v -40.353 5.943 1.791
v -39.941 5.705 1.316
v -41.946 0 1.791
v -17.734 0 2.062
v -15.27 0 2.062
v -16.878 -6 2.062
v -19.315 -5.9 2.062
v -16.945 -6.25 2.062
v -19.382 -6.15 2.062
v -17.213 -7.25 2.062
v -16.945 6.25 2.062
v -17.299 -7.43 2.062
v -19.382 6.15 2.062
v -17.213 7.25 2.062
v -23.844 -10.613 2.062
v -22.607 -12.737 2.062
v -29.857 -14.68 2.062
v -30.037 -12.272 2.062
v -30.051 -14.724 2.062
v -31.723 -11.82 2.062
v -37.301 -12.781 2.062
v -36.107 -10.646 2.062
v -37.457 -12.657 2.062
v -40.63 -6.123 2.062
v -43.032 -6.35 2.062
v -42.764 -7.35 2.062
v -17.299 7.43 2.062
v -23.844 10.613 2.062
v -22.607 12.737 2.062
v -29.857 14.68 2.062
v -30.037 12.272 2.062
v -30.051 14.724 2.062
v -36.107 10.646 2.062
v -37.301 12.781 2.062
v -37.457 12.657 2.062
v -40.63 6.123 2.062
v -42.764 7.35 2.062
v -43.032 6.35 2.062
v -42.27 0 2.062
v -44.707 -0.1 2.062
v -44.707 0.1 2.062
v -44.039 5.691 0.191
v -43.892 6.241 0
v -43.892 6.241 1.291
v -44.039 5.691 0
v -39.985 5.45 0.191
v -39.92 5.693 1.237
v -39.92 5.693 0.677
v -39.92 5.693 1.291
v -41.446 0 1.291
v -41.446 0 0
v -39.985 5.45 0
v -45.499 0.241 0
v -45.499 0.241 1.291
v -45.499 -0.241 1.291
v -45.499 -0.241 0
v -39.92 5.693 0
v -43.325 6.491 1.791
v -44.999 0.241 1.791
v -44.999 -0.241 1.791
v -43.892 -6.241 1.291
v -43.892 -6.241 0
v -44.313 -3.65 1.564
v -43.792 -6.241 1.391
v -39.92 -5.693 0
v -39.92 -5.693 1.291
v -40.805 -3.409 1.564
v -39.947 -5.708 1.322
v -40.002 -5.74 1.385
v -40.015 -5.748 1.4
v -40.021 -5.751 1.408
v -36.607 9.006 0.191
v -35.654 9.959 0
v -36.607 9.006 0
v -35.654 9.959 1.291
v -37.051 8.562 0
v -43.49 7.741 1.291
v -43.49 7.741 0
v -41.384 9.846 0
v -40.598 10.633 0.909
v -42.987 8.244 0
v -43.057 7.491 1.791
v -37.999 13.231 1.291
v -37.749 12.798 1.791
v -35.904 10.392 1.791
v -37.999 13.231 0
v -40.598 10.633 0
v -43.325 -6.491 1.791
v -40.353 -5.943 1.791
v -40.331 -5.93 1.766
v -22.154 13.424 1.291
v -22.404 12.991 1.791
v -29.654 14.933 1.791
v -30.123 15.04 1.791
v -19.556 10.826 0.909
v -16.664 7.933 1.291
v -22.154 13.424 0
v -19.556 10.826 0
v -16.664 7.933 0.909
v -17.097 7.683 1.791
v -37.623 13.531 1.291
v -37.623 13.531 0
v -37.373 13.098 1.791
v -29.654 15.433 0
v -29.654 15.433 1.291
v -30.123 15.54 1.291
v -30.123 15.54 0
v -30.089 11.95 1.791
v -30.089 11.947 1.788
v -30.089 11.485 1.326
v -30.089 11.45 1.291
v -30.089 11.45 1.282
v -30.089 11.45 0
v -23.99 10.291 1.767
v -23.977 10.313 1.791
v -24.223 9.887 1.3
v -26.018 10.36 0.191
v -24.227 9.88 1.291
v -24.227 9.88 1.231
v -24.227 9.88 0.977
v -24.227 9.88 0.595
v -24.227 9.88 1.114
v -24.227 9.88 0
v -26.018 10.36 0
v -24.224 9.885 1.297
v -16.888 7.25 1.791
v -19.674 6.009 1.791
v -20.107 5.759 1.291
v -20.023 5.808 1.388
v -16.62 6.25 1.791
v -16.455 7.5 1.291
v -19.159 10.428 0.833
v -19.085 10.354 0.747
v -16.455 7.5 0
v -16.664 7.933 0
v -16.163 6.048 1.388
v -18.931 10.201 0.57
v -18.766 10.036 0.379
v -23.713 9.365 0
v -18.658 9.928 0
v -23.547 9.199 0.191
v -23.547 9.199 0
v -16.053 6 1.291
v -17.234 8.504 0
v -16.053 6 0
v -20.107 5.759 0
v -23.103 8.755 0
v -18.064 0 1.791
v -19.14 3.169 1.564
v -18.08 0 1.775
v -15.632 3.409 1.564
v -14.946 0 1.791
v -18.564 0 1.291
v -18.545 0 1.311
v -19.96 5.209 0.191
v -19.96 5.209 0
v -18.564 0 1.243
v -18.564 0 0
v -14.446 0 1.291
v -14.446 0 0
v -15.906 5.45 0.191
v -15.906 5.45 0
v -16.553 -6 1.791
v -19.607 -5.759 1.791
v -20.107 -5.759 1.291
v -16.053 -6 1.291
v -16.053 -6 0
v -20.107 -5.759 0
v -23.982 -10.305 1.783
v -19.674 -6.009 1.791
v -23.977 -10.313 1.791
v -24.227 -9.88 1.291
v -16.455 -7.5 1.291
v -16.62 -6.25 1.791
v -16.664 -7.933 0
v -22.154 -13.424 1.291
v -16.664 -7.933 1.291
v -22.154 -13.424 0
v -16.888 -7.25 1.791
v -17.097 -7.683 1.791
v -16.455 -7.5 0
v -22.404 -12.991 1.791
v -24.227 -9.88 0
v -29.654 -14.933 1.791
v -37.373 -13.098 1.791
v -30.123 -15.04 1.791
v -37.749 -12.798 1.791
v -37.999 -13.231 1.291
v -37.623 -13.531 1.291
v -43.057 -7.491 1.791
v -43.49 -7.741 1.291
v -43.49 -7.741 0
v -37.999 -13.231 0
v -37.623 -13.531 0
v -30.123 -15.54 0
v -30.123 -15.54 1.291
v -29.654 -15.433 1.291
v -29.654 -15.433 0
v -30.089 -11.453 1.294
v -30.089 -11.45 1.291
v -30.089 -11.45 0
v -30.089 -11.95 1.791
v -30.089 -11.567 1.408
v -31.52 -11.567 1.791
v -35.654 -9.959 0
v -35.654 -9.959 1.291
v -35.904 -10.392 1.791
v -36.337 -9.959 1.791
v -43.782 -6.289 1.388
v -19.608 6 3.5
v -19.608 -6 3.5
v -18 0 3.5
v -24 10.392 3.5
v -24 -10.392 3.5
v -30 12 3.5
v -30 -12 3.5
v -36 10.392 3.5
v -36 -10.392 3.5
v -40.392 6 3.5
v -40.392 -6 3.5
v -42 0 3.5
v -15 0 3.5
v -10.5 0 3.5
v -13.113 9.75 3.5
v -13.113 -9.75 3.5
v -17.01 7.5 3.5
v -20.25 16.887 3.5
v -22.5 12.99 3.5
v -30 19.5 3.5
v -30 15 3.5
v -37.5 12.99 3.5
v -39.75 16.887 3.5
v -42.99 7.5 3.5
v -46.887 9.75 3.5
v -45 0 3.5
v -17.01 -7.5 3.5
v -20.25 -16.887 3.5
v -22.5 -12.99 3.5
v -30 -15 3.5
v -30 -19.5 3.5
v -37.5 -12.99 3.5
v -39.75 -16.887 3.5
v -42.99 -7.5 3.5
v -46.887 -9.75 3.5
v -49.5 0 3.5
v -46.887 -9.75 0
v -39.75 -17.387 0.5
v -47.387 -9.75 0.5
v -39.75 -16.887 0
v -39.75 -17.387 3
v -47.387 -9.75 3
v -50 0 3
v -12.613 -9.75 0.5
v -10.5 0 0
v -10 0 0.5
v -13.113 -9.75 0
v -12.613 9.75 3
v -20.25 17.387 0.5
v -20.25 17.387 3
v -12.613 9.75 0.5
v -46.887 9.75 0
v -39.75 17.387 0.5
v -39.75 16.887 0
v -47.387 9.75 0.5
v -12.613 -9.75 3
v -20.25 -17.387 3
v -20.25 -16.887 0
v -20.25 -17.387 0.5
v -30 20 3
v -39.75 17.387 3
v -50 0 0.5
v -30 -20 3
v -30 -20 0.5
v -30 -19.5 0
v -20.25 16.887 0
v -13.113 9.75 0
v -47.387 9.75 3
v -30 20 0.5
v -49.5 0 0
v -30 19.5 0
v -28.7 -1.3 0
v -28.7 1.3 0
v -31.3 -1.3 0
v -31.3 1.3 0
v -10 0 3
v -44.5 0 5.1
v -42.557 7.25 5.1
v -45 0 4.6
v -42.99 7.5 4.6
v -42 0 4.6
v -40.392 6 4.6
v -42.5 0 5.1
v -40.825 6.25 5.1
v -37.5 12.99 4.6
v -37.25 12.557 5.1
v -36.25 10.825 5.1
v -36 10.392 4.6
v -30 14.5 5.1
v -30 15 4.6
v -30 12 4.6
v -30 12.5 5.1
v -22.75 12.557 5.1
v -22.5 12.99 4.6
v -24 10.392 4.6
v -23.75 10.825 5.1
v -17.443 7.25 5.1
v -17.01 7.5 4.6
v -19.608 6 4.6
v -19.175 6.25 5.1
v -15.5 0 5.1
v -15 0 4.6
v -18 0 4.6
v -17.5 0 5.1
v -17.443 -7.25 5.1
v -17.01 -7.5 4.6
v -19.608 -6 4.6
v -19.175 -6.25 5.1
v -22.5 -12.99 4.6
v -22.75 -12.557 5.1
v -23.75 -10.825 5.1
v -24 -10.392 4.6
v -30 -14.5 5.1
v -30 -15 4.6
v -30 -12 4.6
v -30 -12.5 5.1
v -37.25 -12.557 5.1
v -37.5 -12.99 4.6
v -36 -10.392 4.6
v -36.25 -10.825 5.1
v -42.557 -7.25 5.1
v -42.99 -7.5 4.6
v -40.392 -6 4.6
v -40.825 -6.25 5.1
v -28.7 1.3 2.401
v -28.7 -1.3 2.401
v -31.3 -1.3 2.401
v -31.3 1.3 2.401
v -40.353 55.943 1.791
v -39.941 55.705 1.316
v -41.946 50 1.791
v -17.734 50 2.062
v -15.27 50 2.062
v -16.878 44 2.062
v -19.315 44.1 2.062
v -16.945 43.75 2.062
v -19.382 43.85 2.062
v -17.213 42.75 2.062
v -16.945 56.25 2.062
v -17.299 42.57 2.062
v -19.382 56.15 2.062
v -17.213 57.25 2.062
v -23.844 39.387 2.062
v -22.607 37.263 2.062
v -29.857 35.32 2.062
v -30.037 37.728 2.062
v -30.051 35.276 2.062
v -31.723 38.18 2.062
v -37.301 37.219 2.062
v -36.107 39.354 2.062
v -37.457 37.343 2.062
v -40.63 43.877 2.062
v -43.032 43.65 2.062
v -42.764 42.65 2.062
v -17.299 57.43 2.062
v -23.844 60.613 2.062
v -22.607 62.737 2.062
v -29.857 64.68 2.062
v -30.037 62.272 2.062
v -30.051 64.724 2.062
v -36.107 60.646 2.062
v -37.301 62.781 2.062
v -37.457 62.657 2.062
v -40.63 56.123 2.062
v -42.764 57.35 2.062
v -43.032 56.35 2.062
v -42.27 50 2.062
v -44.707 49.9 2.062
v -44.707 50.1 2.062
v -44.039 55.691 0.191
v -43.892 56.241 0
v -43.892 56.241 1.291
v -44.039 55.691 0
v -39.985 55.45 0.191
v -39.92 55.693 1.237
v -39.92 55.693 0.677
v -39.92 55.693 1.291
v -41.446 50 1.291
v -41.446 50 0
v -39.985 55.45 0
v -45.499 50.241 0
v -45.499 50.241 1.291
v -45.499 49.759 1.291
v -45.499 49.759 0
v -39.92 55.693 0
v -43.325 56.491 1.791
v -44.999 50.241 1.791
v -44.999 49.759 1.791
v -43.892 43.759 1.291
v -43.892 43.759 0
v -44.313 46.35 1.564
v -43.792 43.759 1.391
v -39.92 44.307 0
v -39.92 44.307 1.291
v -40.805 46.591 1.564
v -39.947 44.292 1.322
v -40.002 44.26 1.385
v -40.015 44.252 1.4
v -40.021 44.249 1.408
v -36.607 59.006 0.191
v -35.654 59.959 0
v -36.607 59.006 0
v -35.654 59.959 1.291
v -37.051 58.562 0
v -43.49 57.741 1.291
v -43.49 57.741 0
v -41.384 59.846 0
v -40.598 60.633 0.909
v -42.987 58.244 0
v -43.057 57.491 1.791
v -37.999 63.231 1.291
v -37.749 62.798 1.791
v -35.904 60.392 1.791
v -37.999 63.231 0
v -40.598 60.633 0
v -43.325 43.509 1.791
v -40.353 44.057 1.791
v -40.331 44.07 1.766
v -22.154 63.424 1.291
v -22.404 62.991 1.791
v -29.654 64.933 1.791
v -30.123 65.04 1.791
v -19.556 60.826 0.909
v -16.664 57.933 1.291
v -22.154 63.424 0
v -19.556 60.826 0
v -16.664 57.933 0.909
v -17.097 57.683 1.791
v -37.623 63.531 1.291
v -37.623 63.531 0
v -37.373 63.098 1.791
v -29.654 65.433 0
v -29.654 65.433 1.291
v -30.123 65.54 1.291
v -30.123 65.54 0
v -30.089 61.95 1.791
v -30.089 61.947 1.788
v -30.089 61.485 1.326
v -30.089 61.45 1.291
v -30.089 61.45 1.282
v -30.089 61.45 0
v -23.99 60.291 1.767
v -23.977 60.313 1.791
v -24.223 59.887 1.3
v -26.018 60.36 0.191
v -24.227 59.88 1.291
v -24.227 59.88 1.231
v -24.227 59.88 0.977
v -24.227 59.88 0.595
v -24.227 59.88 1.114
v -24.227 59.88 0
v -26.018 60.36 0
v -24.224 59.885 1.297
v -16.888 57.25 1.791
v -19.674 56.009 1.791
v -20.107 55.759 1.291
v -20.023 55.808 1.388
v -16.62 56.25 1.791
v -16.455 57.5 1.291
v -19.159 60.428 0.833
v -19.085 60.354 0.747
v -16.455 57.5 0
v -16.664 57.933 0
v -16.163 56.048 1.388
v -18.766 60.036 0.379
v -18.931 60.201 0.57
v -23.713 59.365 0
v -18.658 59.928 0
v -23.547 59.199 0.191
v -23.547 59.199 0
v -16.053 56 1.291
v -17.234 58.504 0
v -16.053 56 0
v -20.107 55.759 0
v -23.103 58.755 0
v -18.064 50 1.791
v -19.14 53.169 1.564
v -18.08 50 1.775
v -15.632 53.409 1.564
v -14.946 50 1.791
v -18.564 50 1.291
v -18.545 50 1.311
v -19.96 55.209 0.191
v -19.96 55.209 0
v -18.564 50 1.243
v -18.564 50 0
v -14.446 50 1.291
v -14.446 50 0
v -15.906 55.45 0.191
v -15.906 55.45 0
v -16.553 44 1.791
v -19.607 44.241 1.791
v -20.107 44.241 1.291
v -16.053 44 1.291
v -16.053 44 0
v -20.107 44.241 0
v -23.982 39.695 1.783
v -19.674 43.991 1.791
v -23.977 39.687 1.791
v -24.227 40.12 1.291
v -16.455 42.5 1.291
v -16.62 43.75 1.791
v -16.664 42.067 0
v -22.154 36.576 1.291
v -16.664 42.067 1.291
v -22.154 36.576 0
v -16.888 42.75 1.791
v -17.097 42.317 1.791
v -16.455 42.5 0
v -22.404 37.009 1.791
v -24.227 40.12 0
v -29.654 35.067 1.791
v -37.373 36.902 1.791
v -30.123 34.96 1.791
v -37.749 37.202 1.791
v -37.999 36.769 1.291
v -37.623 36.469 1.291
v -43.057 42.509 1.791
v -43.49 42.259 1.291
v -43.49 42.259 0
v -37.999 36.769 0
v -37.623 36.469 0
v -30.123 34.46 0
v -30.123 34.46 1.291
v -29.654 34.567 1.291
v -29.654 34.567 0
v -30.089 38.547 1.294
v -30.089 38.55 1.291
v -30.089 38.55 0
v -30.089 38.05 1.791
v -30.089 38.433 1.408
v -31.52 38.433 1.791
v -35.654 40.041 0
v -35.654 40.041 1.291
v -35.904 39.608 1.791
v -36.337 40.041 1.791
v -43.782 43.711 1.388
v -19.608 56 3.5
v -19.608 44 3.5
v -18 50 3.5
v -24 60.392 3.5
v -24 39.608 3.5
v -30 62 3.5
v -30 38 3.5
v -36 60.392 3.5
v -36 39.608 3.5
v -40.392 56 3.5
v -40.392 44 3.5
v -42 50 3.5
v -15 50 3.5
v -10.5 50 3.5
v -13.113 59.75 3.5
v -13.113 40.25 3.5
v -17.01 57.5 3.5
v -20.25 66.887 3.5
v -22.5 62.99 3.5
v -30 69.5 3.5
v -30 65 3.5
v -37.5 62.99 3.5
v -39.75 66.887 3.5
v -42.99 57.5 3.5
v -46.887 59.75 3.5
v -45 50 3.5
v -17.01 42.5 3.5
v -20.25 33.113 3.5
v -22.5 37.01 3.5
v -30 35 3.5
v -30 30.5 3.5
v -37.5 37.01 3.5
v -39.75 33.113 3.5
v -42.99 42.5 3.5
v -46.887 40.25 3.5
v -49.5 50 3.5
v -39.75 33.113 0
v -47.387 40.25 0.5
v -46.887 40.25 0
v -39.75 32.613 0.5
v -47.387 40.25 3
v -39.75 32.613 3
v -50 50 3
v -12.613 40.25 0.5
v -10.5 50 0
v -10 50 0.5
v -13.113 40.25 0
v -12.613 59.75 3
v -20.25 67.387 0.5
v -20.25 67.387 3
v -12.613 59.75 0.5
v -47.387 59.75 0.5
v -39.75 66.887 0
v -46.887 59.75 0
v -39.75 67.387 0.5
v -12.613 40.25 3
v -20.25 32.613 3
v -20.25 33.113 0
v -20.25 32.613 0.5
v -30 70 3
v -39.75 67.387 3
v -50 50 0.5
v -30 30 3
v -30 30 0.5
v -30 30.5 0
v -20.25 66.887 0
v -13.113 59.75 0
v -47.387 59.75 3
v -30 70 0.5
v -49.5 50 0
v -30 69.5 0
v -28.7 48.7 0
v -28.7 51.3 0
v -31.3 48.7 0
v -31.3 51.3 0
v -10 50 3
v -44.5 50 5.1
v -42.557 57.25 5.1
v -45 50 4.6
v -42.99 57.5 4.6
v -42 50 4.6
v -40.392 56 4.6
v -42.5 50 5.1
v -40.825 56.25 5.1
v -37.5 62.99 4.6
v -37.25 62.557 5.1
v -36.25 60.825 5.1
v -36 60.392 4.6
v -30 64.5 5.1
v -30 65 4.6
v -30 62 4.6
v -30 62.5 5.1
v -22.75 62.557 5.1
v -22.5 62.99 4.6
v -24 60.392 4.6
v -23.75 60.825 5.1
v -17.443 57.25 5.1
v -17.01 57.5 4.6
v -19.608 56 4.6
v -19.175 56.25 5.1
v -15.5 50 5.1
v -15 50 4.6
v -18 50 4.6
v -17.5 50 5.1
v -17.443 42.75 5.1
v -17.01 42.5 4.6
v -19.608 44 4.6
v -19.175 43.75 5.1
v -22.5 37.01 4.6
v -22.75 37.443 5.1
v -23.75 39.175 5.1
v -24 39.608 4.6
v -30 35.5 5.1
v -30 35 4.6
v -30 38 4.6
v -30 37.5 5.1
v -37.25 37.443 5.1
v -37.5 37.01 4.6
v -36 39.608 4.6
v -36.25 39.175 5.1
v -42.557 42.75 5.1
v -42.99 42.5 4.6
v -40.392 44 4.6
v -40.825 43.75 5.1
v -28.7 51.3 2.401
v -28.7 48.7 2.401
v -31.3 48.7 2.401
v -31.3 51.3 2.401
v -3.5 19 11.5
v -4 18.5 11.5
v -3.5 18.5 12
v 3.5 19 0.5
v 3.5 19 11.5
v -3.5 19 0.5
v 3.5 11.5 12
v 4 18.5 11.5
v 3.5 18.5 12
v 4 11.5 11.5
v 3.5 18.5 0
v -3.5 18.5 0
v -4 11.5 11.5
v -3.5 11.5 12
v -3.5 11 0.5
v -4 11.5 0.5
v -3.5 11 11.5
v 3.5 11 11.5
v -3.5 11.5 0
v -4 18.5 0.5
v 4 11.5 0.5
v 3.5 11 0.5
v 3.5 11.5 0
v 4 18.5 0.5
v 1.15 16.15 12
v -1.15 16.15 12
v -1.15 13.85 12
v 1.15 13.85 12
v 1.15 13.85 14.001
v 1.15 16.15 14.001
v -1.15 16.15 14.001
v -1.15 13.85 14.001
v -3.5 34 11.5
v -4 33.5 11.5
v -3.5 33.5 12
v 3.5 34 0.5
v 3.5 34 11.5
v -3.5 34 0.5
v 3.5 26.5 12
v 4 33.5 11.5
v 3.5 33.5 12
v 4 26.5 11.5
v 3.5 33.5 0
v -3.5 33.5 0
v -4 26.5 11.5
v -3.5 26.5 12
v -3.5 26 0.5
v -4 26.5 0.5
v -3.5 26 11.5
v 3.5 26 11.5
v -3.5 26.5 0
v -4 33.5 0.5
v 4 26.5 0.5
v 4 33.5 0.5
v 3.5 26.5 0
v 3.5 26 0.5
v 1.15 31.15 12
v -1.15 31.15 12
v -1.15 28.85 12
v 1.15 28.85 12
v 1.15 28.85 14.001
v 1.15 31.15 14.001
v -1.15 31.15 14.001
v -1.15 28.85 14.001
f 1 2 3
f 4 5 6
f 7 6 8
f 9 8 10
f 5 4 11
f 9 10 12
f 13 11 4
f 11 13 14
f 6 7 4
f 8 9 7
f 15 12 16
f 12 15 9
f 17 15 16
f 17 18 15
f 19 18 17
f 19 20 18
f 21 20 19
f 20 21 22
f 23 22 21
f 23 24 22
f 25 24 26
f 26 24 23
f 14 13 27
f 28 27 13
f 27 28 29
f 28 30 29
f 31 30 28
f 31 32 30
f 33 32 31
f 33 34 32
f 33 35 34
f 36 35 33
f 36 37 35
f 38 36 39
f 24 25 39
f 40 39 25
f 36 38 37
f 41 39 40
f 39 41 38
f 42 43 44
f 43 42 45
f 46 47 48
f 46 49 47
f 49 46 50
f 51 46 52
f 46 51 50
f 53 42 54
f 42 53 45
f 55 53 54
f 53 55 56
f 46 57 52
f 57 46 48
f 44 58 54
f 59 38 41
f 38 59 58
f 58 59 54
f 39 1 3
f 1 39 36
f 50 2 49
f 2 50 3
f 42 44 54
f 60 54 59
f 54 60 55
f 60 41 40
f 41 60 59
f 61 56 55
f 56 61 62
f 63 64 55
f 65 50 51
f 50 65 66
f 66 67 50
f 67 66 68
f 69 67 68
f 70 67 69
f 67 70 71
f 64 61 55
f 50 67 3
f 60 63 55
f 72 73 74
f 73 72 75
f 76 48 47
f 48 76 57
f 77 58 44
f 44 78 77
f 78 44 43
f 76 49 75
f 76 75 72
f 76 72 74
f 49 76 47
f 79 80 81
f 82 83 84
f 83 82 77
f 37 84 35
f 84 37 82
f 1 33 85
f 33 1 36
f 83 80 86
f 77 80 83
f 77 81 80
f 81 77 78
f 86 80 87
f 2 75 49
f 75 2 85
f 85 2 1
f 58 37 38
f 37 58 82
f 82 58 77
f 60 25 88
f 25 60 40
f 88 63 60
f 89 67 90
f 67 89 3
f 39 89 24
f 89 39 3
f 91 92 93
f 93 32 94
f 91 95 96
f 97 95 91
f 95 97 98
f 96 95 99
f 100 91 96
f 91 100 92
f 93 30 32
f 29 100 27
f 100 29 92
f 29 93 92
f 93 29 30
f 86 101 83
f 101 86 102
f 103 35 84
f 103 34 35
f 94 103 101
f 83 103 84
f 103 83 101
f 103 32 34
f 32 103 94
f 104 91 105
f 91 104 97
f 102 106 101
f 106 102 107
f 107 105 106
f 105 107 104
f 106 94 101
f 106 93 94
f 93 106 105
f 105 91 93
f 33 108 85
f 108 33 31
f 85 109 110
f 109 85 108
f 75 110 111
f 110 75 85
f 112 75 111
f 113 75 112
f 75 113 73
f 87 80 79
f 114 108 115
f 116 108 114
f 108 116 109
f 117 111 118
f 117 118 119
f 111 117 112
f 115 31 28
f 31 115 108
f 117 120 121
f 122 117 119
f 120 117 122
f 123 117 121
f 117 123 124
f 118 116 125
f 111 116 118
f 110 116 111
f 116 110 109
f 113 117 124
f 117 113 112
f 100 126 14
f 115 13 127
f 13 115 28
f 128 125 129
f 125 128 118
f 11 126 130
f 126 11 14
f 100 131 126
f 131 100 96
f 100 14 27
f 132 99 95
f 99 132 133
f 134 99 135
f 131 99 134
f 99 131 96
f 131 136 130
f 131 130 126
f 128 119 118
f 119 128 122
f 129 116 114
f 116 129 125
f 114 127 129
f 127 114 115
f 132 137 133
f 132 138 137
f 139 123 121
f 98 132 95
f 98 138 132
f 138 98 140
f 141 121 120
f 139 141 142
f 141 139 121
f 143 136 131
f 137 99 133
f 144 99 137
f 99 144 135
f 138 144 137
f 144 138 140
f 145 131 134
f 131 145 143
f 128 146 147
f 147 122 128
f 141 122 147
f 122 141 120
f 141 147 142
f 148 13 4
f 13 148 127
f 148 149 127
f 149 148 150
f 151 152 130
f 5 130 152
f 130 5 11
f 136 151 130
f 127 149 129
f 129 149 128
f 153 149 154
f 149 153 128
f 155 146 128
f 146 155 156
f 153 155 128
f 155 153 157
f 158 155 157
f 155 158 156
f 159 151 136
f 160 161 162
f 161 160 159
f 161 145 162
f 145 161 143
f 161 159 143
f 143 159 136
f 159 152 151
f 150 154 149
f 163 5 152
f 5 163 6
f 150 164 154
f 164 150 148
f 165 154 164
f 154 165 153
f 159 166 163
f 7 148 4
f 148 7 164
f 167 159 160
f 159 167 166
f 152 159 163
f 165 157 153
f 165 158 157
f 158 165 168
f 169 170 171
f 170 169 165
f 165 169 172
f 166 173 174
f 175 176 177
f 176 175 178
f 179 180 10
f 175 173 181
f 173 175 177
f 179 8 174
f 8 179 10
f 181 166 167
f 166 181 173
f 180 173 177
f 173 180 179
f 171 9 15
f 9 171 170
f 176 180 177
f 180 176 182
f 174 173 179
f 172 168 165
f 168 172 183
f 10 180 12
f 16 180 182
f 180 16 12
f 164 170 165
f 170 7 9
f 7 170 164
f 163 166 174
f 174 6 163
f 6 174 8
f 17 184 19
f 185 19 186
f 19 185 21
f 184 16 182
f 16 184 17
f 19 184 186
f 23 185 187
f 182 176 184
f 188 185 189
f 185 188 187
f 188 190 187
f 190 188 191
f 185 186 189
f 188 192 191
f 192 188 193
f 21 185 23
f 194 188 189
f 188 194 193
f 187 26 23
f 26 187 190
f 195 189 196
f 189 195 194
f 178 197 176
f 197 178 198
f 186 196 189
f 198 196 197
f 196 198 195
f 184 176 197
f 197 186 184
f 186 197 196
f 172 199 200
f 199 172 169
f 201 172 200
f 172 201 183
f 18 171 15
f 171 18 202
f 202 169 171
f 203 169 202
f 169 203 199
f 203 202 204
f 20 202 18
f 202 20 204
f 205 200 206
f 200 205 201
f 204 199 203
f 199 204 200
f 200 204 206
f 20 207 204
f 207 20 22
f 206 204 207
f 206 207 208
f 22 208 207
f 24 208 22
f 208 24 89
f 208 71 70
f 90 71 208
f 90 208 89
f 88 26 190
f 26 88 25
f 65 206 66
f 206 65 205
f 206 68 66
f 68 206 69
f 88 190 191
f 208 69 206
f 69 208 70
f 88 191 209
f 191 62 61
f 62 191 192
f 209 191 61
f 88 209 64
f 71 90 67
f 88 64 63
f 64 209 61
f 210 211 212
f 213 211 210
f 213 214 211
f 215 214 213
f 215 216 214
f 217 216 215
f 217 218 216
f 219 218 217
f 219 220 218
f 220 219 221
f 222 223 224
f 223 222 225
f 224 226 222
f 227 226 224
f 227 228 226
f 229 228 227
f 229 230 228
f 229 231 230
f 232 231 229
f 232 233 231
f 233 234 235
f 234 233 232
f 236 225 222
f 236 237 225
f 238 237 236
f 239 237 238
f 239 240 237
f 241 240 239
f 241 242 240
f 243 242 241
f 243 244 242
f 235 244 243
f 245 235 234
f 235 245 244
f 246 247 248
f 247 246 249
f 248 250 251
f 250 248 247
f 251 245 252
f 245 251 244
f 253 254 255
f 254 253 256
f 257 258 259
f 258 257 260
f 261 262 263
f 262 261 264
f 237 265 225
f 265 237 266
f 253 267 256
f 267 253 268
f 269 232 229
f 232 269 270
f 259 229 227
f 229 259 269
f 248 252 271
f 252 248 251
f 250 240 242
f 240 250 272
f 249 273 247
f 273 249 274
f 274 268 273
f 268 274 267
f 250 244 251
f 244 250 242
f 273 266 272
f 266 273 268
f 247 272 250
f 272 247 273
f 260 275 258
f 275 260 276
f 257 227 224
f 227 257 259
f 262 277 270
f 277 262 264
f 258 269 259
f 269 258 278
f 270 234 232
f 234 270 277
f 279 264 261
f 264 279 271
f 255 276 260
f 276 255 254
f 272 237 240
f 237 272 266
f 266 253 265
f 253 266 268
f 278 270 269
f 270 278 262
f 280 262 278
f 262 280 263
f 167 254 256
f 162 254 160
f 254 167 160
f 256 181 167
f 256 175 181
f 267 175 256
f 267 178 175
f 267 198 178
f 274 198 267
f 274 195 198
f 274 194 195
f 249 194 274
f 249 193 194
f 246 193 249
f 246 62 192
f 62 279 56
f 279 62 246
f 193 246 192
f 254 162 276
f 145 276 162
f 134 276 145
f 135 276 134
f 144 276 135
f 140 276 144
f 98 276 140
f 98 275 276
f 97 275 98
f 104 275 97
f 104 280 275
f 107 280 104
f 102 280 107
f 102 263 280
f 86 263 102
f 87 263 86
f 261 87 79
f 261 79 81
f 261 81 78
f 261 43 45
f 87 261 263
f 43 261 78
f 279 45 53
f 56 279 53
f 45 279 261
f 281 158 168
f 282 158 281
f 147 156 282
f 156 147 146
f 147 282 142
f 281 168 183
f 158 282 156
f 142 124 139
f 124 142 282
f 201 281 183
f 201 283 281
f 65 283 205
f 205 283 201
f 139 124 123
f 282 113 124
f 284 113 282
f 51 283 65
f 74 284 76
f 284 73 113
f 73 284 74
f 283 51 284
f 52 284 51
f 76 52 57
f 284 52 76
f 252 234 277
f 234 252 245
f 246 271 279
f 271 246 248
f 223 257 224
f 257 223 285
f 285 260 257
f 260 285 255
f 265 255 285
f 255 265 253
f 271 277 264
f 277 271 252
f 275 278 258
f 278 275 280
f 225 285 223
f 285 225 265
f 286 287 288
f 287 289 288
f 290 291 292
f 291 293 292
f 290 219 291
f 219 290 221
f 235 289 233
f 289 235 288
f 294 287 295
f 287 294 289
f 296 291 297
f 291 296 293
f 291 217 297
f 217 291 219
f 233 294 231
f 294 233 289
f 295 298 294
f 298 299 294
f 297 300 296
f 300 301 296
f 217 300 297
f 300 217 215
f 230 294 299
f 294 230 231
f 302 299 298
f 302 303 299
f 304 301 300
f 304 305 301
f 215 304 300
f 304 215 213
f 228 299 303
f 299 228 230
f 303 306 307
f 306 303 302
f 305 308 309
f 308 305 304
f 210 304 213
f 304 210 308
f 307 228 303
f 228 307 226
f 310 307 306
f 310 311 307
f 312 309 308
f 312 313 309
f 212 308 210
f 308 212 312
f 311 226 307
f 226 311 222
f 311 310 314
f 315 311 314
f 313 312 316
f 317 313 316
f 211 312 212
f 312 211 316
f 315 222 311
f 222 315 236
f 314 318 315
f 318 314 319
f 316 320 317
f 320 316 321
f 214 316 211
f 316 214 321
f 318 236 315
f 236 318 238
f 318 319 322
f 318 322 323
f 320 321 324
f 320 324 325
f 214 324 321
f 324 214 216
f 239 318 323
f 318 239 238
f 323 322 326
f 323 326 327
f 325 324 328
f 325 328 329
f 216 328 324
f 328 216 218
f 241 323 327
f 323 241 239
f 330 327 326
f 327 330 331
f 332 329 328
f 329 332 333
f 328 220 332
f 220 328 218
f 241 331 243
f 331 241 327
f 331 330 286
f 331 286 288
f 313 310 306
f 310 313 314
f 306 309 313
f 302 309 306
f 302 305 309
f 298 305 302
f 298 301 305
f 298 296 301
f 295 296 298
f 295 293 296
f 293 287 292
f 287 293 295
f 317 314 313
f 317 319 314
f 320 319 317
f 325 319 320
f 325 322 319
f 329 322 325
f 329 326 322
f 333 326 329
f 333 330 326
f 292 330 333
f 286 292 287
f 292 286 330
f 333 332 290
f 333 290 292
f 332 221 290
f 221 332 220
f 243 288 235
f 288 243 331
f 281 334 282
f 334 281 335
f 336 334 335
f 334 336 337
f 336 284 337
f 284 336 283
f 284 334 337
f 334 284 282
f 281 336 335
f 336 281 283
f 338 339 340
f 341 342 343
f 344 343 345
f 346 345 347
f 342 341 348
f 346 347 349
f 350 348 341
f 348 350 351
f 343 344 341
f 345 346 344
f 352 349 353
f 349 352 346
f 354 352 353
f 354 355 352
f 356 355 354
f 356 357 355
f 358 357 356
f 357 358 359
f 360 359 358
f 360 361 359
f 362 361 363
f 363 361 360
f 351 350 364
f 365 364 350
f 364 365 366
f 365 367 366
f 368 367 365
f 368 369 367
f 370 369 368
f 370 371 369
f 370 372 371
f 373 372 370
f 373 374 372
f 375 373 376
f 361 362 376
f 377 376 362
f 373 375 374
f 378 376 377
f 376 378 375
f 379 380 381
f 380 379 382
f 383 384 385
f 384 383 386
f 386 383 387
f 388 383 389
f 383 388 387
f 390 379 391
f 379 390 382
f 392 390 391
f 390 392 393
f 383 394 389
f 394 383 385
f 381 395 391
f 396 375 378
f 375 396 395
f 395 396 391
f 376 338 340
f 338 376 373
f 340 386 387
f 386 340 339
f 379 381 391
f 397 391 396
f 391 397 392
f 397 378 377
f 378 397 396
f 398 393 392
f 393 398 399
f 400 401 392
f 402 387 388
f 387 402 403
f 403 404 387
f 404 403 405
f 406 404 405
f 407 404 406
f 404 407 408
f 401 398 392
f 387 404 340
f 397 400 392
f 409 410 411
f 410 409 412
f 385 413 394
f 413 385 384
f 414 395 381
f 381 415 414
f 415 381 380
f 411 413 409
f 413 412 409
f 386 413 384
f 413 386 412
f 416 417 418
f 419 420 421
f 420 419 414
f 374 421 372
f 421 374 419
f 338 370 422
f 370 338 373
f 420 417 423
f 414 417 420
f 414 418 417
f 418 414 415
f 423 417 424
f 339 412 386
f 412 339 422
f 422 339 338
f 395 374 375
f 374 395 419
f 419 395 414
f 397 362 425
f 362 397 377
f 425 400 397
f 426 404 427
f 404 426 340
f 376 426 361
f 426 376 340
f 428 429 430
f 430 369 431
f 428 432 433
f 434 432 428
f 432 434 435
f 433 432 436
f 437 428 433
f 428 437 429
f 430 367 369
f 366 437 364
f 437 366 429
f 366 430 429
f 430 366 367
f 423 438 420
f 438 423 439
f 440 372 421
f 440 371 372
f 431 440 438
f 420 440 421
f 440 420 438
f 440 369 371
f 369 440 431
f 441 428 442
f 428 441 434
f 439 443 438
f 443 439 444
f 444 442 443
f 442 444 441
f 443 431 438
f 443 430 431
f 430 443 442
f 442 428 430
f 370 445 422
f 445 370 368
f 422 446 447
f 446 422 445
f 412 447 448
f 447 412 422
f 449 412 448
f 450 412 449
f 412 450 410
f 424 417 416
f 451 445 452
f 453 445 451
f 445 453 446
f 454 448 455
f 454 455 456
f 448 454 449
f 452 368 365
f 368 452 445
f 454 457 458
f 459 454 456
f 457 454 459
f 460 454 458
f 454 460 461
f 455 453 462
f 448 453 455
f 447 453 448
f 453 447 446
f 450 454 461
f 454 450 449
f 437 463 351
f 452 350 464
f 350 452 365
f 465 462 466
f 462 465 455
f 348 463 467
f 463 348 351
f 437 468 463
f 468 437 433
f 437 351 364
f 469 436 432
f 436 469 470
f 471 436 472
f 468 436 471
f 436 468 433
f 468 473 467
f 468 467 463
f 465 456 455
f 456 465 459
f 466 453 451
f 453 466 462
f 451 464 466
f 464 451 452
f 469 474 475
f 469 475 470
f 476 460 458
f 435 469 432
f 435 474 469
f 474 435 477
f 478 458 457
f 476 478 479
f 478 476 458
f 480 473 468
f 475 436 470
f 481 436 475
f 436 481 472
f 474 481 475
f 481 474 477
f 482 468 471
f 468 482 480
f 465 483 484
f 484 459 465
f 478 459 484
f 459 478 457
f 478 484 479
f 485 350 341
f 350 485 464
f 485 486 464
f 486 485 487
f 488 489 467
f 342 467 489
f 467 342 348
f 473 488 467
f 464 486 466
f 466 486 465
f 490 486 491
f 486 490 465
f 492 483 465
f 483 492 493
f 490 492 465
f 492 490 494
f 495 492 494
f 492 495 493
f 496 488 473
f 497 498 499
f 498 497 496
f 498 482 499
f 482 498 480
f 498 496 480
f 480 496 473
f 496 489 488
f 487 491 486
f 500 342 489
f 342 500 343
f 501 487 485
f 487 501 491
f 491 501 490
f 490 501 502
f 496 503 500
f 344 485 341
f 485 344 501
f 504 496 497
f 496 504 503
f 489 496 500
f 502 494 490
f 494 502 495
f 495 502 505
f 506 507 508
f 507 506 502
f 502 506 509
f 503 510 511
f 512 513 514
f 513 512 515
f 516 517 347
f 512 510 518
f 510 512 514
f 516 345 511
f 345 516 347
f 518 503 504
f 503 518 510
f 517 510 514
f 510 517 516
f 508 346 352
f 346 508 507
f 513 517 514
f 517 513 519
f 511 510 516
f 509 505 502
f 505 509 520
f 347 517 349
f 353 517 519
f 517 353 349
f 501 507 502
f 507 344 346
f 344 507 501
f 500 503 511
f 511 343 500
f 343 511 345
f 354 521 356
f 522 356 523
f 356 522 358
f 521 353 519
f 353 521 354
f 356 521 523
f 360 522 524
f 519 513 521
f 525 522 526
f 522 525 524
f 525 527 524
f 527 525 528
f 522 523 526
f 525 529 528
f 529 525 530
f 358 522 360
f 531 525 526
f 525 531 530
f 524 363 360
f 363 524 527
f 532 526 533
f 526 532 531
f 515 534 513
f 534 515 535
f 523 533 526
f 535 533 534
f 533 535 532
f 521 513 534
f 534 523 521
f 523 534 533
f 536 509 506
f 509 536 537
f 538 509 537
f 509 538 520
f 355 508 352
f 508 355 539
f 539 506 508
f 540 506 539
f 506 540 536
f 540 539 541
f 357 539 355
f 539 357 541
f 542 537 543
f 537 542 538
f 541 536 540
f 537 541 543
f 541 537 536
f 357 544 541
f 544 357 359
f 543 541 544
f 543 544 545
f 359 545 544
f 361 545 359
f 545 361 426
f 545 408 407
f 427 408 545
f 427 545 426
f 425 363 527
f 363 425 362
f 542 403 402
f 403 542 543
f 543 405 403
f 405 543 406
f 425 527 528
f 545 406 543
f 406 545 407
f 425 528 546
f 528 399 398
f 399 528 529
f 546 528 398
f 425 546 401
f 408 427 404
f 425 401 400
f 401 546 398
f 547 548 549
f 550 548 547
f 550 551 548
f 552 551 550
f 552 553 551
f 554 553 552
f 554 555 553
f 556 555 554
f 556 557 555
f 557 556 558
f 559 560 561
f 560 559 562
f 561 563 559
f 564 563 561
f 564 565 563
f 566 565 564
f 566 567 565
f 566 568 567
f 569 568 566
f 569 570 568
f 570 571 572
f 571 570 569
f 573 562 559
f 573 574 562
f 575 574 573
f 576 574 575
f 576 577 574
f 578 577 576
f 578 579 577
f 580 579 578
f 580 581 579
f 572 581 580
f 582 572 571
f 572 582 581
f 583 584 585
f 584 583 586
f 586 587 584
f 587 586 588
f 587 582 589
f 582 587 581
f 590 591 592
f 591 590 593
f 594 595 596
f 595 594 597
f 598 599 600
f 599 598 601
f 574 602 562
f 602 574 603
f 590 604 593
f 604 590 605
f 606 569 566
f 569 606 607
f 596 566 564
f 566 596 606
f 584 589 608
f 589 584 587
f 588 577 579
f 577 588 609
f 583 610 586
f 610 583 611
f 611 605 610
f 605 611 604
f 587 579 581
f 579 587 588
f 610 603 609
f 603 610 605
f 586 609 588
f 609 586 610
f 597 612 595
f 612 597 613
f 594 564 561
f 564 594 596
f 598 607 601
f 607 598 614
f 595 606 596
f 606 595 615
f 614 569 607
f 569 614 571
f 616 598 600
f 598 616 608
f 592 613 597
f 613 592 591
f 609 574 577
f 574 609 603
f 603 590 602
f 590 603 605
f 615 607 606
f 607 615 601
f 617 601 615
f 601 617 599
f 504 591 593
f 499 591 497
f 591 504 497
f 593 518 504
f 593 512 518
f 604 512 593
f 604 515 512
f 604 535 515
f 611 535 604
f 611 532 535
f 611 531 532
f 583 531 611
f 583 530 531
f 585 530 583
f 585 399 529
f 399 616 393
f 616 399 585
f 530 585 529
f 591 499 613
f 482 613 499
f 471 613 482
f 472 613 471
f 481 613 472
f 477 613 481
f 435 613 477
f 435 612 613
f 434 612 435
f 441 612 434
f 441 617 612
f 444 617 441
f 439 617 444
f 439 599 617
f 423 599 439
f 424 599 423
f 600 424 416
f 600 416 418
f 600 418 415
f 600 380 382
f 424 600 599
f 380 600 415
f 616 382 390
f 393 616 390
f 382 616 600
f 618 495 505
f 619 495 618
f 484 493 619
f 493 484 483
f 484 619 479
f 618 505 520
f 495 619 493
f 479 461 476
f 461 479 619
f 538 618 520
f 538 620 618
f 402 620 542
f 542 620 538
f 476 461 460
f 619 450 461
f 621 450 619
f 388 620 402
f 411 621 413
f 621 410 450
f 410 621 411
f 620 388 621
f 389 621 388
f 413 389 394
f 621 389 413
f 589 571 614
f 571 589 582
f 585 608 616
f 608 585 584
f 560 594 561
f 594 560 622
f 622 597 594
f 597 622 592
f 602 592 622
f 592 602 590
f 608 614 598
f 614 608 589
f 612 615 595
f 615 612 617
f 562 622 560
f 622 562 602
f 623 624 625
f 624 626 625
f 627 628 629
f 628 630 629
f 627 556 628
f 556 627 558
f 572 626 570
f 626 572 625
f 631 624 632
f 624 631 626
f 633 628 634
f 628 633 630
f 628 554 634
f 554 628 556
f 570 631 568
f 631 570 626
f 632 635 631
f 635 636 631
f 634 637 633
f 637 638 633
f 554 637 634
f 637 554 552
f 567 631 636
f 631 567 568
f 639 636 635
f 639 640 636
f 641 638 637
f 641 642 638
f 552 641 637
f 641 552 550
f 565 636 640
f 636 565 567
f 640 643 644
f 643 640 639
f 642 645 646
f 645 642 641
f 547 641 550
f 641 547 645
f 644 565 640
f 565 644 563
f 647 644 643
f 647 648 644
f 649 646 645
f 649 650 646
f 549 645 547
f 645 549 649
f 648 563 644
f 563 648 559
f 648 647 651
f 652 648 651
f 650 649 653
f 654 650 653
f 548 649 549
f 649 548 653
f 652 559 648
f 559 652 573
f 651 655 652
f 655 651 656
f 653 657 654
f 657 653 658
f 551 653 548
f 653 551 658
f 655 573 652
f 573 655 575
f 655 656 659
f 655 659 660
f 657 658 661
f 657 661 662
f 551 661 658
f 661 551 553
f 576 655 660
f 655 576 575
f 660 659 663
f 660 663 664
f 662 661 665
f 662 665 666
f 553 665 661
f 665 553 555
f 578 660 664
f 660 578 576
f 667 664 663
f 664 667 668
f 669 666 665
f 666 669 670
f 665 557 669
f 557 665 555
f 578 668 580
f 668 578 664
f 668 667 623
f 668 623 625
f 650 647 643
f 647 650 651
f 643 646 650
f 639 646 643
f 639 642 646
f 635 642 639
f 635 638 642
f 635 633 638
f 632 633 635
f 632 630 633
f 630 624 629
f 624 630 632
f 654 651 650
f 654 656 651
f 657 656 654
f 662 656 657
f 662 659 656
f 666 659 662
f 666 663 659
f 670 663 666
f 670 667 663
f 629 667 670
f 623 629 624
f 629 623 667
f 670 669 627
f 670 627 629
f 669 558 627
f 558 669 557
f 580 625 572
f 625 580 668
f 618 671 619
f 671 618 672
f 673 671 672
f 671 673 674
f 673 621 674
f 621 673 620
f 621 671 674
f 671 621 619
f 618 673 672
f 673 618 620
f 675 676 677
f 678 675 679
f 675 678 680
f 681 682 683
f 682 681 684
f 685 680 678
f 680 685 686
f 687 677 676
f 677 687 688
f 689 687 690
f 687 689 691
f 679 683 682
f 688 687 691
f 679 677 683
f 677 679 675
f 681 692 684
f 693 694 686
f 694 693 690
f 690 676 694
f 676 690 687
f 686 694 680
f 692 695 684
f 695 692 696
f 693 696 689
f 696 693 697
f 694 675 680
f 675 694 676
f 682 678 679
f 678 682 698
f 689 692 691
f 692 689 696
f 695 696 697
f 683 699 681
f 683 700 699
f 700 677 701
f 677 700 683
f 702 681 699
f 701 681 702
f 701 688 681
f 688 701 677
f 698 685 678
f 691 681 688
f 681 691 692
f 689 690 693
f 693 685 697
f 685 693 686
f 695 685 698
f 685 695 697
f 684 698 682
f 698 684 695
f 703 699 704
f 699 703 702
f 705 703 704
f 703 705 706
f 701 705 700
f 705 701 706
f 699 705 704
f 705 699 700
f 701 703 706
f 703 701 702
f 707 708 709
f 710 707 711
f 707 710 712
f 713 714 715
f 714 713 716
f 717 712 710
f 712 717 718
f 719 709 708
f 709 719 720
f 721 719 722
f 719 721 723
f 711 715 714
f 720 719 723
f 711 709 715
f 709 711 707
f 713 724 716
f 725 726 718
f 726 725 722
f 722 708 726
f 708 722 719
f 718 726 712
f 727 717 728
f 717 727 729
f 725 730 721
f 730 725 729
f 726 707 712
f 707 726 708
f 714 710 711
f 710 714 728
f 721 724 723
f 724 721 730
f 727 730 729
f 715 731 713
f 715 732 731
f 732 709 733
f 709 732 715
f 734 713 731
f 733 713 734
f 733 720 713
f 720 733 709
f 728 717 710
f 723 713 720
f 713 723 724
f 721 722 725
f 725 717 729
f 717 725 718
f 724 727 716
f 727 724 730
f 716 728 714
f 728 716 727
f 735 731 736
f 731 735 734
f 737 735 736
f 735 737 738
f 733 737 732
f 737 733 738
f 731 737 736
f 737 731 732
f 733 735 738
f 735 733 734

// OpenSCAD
// file: head.scad
include <common.scad>

// Studs are 1.7mm high and 3mm in diameter. They are spaced
// 2mm in from the edges of an 18x18mm square.
module four_studs() {
  column_height = 1.1;
  radius = 1.5;
  displacement = 5.5;
  
  for (a = [-1, 1], b = [-1, 1]) {
    scale([a, b, 1]) {
      translate([displacement, displacement, 0]) {
        cylinder(column_height+eps, radius, radius);
        translate([0, 0, column_height])
          cylinder(0.5, radius, radius-0.5);
      }
    }
  }
}

module four_holes() {
  minkowski() {
    four_studs();
    sphere(0.5);
  }
}

// A stackable box, 18x18mm, with optional studs and holes.
module stackable_box(height, studs=true, holes=true) {
  difference() {
    union() {
      chamfered_box([18, 18, height]);
      if (studs)
        translate([0, 0, height - eps])
          four_studs();
    }
    if (holes)
      translate([0, 0, -eps])
        four_holes();
  }
}

// A stackable chip, for going on top of a head.
module head_chip() {
  stackable_box(3.5);
}

// A head, which is intended to have 2 chips stacked on top.
module head(face_raster) {
  // Lift the head slightly to fit the lug underneath.
  translate([0, 0, locking_lug_dims.z]) {
    difference() {
      // A 10mm head plus two 3.5mm chips comes to 17mm,
      // which is slightly less than the 18mm width. That's
      // by design. It looks better not to have such tall 
      // heads, perhaps because the studs on top give the
      // illusion of added height.
      stackable_box(10, holes=false);
      
      // Bring the mask out a bit extra (0.05mm) to avoid
      // having it intersect the studs at all.
      translate([0, -9.05, 0])
        face(face_raster);
    }
    
    // A lug for gluing to a body.
    scale([1, 1, -1])
      locking_lug();
  }
}

// 'raster' is an array of 5 rows, where each row has 8
// elements. Each element should be in [0, 1]. A '1' means the
// given position will be fully engraved on the face.
// Returns a mask which should be subtracted from the head.
// The Z axis will coincide with the centerline of the 
// mask's front.
module face(raster) {
  // Below we use a unit of 1 to represent one pixel on
  // the face. Scale up to an 18mm face, 8 pixels wide.
  scale([2.25, 2.25, 2.25]) {
    translate([-4, -eps, -eps]) {
      difference() {
        // Begin with a filled-in face plate.
        translate([-eps, -eps, -eps])
          cube([8+2*eps, 0.9+2*eps, 5+2*eps]);
        
        // Subtract the material which needs to remain on the
        // head. Leave some support under each shelf.
        for (r = [0:4])
          for (c = [0:7])
            translate([c-eps, raster[r][c]-eps, 4-r-eps])
              rotate([90, 0, 90])
                translate([0, 0, -2*eps])
                  linear_extrude(1+4*eps)
                    polygon([
                      [   -2*eps,     -2*eps],
                      [0.9+2*eps, -0.5-2*eps],
                      [0.9+2*eps,    1+2*eps],
                      [   -2*eps,    1+2*eps],
                    ]);
      }
    }
  }
}

module creeper_head() {
  head([
    [0, 1, 1, 0, 0, 1, 1, 0],
    [0, 1, 1, 0, 0, 1, 1, 0],
    [0, 0, 0, 1, 1, 0, 0, 0],
    [0, 0, 1, 1, 1, 1, 0, 0],
    [0, 0, 1, 0, 0, 1, 0, 0],
  ]);
}

module zombie_head() {
  head([
    [0.0, 0.0, 0.0, 0.0, 0.0, 0.0, 0.0, 0.0],
    [0.0, 1.0, 1.0, 0.0, 0.0, 1.0, 1.0, 0.0],
    [0.0, 0.0, 0.0, 0.8, 0.8, 0.0, 0.0, 0.0],
    [0.0, 0.0, 0.2, 0.2, 0.2, 0.2, 0.0, 0.0],
    [0.0, 0.0, 0.2, 0.2, 0.2, 0.2, 0.0, 0.0],
  ]);
}

module skeleton_head() {
  head([
    [0, 0, 0, 0, 0, 0, 0, 0],
    [0, 1, 1, 0, 0, 1, 1, 0],
    [0, 0, 0, 1, 1, 0, 0, 0],
    [0, 1, 1, 1, 1, 1, 1, 0],
    [0, 0, 0, 0, 0, 0, 0, 0],
  ]);
}

module spider_head() {
  head([
    [1, 0, 0, 0, 0, 0, 0, 1],
    [1, 0, 1, 1, 1, 1, 0, 1],
    [0, 0, 1, 1, 1, 1, 0, 0],
    [0, 0, 0, 0, 0, 0, 0, 0],
    [0, 0, 1, 0, 0, 1, 0, 0],
  ]);
}

module steve_head() {
  head([
    [0, 0, 0, 0, 0, 0, 0, 0],
    [0, 0.7, 1, 0, 0, 1, 0.7, 0],
    [0, 0, 0, 0.8, 0.8, 0, 0, 0],
    [0, 0, 1, 0, 0, 1, 0, 0],
    [0, 0, 1, 1, 1, 1, 0, 0],
  ]);
}

// Demo.
head_chip();
// file: body.scad
include <common.scad>
use <base.scad>
use <head.scad>

// TODO: these lugs are probably off center.

arm_girth = 8;
leg_girth = 9;

module basic_body(zombie_arms=false) {
  difference() {
    torso_breadth = 18;
    torso_height = 18;
    leg_height = 13;

    union() {
      // Torso.
      chamfered_box([torso_breadth, 10, torso_height]);

      // Shoulders.
      chamfered_box([
        torso_breadth + arm_girth*2, arm_girth, arm_girth]);

      // Legs.
      for (a = [-1, 1])
        scale([a, 1, 1])
          translate([leg_girth/2, 0, torso_height])
            chamfered_box([leg_girth, leg_girth, leg_height]);
    }
    
    // Head locking socket.
    locking_socket();
    
    // Arm locking sockets.
    for (a = [-1, 1]) {
      scale([a, 1, 1]) {
        if (zombie_arms) {
          translate([
            (torso_breadth+arm_girth)/2,
            -arm_girth/2,
            arm_girth/2
          ])
            rotate([-90, 0, 0])
              locking_socket();
        } else {
          translate([(torso_breadth+arm_girth)/2, 0, arm_girth])
            scale([1, 1, -1])
              locking_socket();
        }
      }
    }
        
    // Baseplate locking socket.
    translate([0, 0, torso_height+leg_height])
      scale([1, 1, -1])
        locking_socket();
  }
}

module arm(length=12) {
  chamfered_box([arm_girth, arm_girth, length]);
  
  // Locking lug.
  translate([0, 0, length])
    locking_lug();
}
// file: base.scad
include <common.scad>

module ring() {
  rotate_extrude(angle=360)
    translate([12, 0, 0])
      polygon([
        [0, 0],
        [3, 0],
        [3, 1.1],
        [2.5, 1.6],
        [0.5, 1.6],
        [0, 1.1],
      ]);
}

module ring_hole() {
  minkowski() {
    ring();
    // Widen the hole slightly to accommodate imperfect circles
    // with some looseness.
    scale([0.6, 0.6, 0.5])
      sphere(1);
  }
}

module base(lug=true) {
  difference() {
    union() {
      chamfered_disk(3.5, 20);
      
      // A lug for gluing a body.
      if (lug)
        translate([0, 0, 3.5])
          locking_lug();
    }
    ring_hole();
  }
}

module base_chip() {
  base(lug=false);
  translate([0, 0, 3.5])
    ring();
}

// Demo.
base();
// file: common.scad
// Unless otherwise specified, each resulting shape is
// resting on the XY plane, centered on the Z axis.

// A small amount to make sure shapes overlap when needed. This
// is well below the resolution of my 3D printer, so it
// shouldn't affect the final result.
eps = 0.001;

// If printing, use high quality renderings.
print = false;
$fa = print ? 5 : 30;
$fs = print ? 0.3 : 1;

// Standard chamfer on all edges and corners. This makes the
// pieces more comfortable to handle.
chamfer = 0.5;

// A regular octahedron centered on the origin with its vertices
// on the axes. 'axis' gives its full length along each axis.
module octahedron(axis) {
  // Top and bottom halves.
  for (a = [-1, 1])
    scale([1, 1, a])
      // Extrude a square into a pyramid.
      linear_extrude(axis/2, scale=0)
        rotate([0, 0, 45])
          square(norm([axis/2, axis/2]), center=true);
}

// 'd' is the outer dimensions of the box.
module chamfered_box(d) {
  assert(d.x >= 1);
  assert(d.y >= 1);
  assert(d.z >= 1);

  // Raise the result up so it is resting on the XY plane.
  translate([0, 0, d.z/2]) {
    minkowski() {
      // The desired cube, scaled back by the chamfer distance
      // in all directions.
      cube(d - [chamfer*2, chamfer*2, chamfer*2], center=true);
      octahedron(chamfer*2);
    }
  }
}

module chamfered_disk(height, radius) {
  assert(radius >= 0.5);
  assert(height >= 1);

  // Raise the result up so it is resting on the XY plane.
  translate([0, 0, height/2]) {
    minkowski() {
      // The desired disk, scaled back by the chamfer distance
      // in all directions.
      cylinder(height-chamfer*2, r=radius-chamfer, center=true);
      octahedron(chamfer*2);
    }
  }
}

locking_lug_dims = [2.3, 2.3, 2+2*eps];

// A snug fit for gluing.
module locking_lug() {
  translate([0, 0, locking_lug_dims.z/2-eps])
    cube(locking_lug_dims, center=true);
}

module locking_socket(bottom=false) {
  // Make extra sure the lug will fit all the way into
  // the hole.
  extra_depth = 0.4;
  
  // When printing this on the bottom of a model, it
  // needs to be a bit wider to account for elephant-foot.
  extra_width = bottom ? 0.3 : 0.2;
  
  extra = [extra_width, extra_width, extra_depth];
  translate([0, 0, (locking_lug_dims.z+extra_depth)/2-eps])
    cube(locking_lug_dims + extra, center=true);
}
// main file
include <common.scad>
use <base.scad>
use <body.scad>
use <head.scad>

// Bring everything together to build a printable design.

translate([-30, 0, 0]) {
  difference() {
    base_chip();
    locking_socket(bottom=true);
  }
  translate([0, 50, 0]) {
    difference() {
      base_chip();
      locking_socket(bottom=true);
    }
  }
}

translate([0, 15, 0]) {
  arm();
  translate([0, 15, 0]) {
    arm();
  }
}
